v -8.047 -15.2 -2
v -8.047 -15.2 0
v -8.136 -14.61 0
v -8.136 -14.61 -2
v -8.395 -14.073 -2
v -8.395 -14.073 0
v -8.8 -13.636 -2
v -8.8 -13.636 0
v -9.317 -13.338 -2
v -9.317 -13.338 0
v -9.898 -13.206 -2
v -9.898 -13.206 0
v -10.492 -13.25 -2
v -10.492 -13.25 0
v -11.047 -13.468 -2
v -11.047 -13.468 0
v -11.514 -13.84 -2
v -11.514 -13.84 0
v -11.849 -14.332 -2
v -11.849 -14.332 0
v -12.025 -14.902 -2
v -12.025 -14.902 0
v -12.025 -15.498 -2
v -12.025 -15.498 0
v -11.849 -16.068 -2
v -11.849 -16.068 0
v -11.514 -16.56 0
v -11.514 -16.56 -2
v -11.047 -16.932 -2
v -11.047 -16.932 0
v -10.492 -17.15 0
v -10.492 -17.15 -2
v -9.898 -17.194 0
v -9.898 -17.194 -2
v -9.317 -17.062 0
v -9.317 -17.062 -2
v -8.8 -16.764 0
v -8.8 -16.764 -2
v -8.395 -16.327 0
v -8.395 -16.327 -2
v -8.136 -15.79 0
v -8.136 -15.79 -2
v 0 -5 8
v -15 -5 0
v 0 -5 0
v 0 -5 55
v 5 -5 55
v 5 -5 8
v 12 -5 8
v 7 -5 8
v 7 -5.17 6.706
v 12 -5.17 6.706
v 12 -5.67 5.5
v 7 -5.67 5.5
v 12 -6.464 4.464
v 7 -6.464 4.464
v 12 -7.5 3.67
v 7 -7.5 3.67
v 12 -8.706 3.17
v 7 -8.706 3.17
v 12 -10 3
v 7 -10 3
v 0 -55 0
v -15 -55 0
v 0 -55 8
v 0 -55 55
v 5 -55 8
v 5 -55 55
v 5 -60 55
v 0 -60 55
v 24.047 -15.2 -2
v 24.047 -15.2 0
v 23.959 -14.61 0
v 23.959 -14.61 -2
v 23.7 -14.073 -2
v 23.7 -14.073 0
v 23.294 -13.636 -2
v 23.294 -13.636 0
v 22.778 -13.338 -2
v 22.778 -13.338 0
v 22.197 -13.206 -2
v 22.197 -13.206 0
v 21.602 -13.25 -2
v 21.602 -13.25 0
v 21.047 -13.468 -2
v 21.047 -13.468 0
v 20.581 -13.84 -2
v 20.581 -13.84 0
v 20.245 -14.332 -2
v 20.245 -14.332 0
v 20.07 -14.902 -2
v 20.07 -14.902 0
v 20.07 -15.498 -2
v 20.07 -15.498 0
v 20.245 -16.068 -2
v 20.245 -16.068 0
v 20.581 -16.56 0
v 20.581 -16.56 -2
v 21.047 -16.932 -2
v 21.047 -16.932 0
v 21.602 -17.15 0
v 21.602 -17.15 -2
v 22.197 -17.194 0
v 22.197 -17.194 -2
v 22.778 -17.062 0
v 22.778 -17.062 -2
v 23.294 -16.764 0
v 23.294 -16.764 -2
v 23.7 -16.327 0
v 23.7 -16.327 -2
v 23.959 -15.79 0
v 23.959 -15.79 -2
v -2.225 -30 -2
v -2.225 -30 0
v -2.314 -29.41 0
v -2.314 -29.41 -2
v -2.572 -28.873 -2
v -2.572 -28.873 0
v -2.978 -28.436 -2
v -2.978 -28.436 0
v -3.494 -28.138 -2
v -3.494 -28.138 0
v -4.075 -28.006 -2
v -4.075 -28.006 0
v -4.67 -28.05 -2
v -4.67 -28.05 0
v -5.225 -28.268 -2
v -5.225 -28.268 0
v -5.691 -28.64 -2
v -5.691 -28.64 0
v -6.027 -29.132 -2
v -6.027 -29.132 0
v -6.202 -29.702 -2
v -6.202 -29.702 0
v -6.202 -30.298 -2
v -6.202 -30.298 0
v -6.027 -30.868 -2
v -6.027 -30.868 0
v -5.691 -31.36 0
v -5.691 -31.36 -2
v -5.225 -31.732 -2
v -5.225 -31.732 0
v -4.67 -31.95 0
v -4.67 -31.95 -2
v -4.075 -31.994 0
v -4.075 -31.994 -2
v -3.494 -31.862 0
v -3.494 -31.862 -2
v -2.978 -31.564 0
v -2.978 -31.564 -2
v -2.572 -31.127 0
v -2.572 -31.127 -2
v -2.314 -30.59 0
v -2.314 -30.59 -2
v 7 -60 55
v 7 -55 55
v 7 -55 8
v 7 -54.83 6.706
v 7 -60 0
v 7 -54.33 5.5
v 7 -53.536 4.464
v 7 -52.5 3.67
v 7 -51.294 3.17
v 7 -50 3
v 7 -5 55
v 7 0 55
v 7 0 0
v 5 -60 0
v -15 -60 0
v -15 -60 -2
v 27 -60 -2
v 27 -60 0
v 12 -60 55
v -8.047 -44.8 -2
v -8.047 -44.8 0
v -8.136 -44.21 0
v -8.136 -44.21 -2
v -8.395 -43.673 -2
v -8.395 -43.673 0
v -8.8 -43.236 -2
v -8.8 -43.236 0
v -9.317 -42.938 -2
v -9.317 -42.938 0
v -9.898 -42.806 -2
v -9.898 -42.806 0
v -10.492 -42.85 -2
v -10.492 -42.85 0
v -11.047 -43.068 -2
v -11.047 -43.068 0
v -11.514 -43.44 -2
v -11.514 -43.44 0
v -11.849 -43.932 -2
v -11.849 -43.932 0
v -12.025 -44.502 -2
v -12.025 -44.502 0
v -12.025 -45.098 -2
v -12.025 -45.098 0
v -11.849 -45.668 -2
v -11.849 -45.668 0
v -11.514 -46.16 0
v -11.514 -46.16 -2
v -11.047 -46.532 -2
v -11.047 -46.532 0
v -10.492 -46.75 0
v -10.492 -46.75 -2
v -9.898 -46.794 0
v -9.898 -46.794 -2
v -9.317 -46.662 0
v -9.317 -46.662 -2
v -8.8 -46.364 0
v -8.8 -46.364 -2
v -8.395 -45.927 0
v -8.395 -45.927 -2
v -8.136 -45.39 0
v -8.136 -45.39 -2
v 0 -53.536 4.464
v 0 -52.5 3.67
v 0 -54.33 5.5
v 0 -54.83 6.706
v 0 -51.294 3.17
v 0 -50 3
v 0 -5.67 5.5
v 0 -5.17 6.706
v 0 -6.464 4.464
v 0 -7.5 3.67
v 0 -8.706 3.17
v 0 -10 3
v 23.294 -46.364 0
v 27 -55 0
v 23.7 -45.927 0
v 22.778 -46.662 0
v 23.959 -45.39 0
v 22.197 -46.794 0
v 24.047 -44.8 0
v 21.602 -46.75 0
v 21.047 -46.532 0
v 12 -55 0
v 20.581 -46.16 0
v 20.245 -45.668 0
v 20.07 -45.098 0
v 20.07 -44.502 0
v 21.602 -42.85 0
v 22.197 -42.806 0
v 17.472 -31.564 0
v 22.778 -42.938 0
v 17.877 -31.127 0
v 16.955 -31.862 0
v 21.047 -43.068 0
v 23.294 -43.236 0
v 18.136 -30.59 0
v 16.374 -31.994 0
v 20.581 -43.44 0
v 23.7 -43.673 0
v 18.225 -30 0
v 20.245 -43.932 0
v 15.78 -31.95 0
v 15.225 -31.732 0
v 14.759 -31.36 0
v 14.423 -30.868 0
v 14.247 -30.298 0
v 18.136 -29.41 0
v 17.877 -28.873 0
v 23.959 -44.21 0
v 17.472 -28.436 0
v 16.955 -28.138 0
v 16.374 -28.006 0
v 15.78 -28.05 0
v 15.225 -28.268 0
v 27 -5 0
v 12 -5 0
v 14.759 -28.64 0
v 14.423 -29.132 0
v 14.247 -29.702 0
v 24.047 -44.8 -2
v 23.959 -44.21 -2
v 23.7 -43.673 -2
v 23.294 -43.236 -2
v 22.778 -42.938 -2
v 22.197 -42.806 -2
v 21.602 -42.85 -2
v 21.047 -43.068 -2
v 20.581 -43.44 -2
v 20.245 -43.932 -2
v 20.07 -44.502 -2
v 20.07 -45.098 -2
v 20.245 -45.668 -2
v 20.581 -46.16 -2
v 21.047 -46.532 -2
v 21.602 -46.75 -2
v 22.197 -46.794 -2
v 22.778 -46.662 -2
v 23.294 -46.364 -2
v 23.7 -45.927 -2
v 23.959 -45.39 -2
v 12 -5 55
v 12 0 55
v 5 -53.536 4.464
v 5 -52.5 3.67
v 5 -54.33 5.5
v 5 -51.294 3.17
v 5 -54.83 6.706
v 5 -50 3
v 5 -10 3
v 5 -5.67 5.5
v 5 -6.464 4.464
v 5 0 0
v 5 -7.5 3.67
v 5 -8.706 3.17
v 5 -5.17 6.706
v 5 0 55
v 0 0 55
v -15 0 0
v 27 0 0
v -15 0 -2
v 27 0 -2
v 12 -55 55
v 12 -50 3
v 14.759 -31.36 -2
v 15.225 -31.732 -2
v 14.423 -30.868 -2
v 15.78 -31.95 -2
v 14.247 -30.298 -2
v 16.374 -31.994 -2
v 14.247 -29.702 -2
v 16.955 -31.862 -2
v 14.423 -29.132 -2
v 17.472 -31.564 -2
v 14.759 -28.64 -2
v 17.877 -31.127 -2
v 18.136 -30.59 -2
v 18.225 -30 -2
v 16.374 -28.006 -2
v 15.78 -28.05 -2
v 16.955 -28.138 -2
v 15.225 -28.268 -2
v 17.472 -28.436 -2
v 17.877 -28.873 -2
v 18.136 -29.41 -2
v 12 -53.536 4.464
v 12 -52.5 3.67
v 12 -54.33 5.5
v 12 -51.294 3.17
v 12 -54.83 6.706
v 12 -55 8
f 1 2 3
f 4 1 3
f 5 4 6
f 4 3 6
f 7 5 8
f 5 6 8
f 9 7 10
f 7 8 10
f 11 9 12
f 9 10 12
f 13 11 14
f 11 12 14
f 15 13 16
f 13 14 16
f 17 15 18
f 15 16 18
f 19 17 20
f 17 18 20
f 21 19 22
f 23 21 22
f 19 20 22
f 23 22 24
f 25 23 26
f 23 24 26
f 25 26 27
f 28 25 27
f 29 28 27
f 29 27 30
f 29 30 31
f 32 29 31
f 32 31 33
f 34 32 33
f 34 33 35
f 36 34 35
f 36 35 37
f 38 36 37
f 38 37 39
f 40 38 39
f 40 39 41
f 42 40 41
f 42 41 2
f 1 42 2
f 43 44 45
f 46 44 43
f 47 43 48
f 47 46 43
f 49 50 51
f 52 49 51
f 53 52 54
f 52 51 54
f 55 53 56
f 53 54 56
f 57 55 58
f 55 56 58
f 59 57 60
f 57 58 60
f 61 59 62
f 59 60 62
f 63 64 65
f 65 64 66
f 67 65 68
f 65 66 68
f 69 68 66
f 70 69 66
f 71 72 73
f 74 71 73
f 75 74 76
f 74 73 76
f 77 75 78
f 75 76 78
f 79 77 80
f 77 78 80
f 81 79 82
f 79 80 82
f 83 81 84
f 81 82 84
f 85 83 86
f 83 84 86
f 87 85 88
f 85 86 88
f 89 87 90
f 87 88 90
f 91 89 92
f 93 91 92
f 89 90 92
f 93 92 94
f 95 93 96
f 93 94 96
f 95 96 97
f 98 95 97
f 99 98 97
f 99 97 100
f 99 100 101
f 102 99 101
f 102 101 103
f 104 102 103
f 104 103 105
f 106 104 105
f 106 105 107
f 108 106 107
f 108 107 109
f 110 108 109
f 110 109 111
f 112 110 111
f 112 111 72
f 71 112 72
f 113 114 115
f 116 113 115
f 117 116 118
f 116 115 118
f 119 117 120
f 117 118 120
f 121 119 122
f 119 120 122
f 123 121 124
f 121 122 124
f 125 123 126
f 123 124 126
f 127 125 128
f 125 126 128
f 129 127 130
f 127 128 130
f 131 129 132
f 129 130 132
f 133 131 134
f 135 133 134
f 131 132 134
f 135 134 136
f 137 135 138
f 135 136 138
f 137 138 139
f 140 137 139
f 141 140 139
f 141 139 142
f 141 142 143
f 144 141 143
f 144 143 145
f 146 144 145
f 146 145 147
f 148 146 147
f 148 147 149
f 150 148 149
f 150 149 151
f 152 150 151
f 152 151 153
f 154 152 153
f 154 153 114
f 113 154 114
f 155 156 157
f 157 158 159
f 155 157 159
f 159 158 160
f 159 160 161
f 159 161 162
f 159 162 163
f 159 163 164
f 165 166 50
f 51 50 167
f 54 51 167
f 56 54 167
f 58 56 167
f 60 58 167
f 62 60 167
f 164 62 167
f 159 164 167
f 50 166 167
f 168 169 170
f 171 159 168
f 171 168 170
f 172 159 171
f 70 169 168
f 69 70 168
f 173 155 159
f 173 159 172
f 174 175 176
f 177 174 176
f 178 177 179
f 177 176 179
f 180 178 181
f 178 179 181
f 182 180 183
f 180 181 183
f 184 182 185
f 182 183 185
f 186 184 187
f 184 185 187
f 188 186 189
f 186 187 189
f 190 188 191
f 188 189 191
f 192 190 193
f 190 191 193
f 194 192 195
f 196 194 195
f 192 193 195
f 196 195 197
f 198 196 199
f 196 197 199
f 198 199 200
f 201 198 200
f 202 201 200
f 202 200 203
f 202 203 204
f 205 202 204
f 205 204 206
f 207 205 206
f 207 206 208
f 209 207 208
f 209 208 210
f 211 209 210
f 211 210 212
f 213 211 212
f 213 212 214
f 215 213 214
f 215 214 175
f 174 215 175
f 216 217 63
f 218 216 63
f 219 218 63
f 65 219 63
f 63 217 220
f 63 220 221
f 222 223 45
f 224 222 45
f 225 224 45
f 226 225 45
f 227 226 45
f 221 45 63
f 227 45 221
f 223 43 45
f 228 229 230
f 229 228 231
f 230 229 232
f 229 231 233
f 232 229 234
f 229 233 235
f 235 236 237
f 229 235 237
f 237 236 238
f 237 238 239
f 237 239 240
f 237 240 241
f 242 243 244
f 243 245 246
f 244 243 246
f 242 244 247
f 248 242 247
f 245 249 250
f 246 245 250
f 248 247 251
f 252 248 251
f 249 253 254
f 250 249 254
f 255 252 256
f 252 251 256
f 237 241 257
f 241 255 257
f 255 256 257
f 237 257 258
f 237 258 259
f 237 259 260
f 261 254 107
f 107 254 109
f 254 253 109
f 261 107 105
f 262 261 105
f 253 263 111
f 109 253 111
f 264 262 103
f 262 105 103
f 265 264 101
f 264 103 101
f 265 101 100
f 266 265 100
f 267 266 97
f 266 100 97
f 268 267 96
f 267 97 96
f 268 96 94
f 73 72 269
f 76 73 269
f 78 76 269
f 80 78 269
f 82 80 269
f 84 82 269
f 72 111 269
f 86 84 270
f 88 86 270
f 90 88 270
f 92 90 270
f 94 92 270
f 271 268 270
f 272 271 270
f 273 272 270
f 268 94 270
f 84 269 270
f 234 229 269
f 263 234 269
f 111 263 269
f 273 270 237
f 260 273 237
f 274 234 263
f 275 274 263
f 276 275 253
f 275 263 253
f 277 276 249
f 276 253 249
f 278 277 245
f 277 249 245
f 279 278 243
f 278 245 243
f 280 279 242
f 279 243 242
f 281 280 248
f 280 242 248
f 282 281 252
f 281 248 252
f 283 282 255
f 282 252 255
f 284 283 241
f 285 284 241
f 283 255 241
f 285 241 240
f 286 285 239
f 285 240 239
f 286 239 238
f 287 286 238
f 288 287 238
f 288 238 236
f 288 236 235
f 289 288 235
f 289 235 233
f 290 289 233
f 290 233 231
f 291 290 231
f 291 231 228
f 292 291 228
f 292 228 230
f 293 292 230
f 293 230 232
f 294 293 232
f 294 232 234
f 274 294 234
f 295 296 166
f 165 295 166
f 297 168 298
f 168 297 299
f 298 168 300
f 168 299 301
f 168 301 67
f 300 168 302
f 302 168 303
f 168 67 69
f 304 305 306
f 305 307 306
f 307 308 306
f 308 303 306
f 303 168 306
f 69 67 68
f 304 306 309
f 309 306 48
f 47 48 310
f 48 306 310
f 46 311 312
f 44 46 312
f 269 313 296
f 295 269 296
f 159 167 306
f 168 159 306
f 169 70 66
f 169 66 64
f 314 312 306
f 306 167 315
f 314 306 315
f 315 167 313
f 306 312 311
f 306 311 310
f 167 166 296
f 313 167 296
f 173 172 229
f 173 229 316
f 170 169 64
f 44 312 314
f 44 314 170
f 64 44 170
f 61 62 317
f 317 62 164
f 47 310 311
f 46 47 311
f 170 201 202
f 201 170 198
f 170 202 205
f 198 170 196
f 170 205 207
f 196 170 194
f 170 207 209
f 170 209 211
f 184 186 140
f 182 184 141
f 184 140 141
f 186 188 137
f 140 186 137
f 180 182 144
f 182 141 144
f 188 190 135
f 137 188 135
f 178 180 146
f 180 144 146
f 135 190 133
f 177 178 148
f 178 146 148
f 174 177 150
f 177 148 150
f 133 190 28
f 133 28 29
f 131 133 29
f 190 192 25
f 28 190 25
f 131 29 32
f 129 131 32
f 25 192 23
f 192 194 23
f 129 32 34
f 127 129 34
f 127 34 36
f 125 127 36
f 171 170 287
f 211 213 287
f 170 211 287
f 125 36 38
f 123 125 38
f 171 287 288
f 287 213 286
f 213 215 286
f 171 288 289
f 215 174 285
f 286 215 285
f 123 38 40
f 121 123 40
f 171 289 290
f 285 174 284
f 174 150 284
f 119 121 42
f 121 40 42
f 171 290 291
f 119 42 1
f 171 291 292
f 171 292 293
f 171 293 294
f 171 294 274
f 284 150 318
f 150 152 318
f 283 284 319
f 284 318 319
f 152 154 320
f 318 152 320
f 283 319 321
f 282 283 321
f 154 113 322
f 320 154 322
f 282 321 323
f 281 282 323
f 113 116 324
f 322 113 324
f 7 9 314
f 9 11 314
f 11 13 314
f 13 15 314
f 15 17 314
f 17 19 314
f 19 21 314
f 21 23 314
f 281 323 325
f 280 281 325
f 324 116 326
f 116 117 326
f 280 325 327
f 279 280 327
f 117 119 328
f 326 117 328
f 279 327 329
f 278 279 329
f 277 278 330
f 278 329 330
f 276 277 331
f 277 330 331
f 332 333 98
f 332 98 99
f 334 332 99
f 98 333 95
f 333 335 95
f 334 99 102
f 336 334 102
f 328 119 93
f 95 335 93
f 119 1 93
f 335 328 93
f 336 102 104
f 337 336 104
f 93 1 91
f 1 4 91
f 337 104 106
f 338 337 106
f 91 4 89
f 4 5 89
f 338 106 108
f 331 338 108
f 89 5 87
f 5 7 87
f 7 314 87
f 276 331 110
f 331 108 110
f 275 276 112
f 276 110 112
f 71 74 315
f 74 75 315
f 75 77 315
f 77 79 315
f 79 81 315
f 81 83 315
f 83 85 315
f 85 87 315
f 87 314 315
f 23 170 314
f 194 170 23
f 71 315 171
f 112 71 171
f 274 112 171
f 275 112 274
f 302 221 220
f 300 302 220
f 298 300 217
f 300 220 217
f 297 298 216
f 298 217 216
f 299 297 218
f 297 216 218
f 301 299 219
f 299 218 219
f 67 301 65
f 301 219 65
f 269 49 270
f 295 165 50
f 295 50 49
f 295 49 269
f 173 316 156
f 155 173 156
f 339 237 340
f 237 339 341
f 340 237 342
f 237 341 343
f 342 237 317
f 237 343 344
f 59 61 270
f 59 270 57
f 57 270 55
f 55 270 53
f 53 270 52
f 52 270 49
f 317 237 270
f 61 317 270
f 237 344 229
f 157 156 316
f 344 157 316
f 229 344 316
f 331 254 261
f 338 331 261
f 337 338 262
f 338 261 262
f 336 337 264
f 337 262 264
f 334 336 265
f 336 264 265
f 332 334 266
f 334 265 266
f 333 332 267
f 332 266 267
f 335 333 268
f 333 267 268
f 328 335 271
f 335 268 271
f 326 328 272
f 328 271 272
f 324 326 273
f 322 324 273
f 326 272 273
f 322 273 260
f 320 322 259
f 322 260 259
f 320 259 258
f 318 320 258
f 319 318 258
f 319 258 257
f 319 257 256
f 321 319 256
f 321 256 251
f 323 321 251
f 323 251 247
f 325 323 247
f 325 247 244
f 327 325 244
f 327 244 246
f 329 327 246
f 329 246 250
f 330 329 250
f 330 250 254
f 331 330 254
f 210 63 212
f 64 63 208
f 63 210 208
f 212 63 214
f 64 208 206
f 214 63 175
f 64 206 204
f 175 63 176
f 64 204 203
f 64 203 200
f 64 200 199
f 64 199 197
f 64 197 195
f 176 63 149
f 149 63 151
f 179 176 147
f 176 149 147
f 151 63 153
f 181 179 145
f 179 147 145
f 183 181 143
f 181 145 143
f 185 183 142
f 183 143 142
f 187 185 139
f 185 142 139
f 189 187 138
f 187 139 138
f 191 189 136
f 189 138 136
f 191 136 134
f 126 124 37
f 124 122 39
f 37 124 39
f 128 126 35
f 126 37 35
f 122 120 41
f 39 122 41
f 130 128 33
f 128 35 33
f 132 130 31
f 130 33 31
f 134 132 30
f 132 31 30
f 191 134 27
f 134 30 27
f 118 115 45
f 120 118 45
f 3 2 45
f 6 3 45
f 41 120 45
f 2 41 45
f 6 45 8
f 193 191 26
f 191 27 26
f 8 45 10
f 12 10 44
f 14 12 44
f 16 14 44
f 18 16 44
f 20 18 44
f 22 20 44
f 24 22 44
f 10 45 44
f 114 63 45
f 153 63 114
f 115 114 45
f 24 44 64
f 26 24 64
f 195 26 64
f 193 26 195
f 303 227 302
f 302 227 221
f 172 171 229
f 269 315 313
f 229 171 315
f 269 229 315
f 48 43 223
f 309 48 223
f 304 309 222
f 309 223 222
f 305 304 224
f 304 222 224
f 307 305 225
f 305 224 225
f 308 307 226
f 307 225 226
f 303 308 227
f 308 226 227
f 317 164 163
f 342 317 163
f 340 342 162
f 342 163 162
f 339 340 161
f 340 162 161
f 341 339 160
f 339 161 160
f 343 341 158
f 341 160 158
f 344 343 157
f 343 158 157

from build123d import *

# Parameters (mm, degrees)
F1_DEPTH = 60
F3_DEPTH = 27.001
F4_R     = 2
F5_DEPTH = 25
F7_DEPTH = 5


with BuildPart() as f1:
    # F0 (on Front) → F1 (new body)
    with BuildSketch(Plane.XZ):
        Polygon((0, 55), (0, 0), (-15, 0), (-15, -2), (27, -2), (27, 0), (12, 0), (12, 55), (7, 55), (7, 0), (5, 0), (5, 55), align=None)
    extrude(amount=F1_DEPTH)

    # F2 (on face) → F3 (cut, through all)
    with BuildSketch(Plane(origin=(0, 0, 0), x_dir=(0, -1, 0), z_dir=(-1, 0, 0))):
        with BuildLine():
            Line((55, 55), (5, 55))
            Line((5, 55), (5, 8))
            ThreePointArc((5, 8), (6.4644660941, 4.4644660941), (10, 3))
            Line((10, 3), (50, 3))
            ThreePointArc((50, 3), (53.5355339059, 4.4644660941), (55, 8))
            Line((55, 8), (55, 55))
        make_face()
    extrude(amount=-F3_DEPTH, mode=Mode.SUBTRACT)

    # F4 (on face) → F5 (cut)
    with BuildSketch(Plane.XY):
        with Locations((-10.0474134088, -15.2)):
            Circle(F4_R)
        with Locations((-10.0474134088, -44.8)):
            Circle(F4_R)
        with Locations((-4.2247553356, -30)):
            Circle(F4_R)
        with Locations((16.2247553356, -30)):
            Circle(F4_R)
        with Locations((22.0474134088, -44.8)):
            Circle(F4_R)
        with Locations((22.0474134088, -15.2)):
            Circle(F4_R)
    extrude(amount=-F5_DEPTH, mode=Mode.SUBTRACT)



with BuildPart() as f7:
    # F6 (on face) → F7 (new body, through all)
    with BuildSketch(Plane.XZ.offset(60)):
        Polygon((0, 55), (-15, 0), (0, 0), align=None)
    extrude(amount=-F7_DEPTH)


with BuildPart() as f7b:
    # F6 (on face) → F7, piece 2 (new body, through all)
    with BuildSketch(Plane.XZ.offset(60)):
        Polygon((27, 0), (12, 55), (12, 0), align=None)
    extrude(amount=-F7_DEPTH)


with BuildPart() as f1_1:
    add(f1.part)

    add(f7.part)  # F10 merges F7

    add(f7b.part)  # F10 merges F7b
    # F10: F7b, F7 across plane
    add(f7b.part.mirror(Plane.XZ.offset(30)))
    add(f7.part.mirror(Plane.XZ.offset(30)))


solid = f1_1.part
